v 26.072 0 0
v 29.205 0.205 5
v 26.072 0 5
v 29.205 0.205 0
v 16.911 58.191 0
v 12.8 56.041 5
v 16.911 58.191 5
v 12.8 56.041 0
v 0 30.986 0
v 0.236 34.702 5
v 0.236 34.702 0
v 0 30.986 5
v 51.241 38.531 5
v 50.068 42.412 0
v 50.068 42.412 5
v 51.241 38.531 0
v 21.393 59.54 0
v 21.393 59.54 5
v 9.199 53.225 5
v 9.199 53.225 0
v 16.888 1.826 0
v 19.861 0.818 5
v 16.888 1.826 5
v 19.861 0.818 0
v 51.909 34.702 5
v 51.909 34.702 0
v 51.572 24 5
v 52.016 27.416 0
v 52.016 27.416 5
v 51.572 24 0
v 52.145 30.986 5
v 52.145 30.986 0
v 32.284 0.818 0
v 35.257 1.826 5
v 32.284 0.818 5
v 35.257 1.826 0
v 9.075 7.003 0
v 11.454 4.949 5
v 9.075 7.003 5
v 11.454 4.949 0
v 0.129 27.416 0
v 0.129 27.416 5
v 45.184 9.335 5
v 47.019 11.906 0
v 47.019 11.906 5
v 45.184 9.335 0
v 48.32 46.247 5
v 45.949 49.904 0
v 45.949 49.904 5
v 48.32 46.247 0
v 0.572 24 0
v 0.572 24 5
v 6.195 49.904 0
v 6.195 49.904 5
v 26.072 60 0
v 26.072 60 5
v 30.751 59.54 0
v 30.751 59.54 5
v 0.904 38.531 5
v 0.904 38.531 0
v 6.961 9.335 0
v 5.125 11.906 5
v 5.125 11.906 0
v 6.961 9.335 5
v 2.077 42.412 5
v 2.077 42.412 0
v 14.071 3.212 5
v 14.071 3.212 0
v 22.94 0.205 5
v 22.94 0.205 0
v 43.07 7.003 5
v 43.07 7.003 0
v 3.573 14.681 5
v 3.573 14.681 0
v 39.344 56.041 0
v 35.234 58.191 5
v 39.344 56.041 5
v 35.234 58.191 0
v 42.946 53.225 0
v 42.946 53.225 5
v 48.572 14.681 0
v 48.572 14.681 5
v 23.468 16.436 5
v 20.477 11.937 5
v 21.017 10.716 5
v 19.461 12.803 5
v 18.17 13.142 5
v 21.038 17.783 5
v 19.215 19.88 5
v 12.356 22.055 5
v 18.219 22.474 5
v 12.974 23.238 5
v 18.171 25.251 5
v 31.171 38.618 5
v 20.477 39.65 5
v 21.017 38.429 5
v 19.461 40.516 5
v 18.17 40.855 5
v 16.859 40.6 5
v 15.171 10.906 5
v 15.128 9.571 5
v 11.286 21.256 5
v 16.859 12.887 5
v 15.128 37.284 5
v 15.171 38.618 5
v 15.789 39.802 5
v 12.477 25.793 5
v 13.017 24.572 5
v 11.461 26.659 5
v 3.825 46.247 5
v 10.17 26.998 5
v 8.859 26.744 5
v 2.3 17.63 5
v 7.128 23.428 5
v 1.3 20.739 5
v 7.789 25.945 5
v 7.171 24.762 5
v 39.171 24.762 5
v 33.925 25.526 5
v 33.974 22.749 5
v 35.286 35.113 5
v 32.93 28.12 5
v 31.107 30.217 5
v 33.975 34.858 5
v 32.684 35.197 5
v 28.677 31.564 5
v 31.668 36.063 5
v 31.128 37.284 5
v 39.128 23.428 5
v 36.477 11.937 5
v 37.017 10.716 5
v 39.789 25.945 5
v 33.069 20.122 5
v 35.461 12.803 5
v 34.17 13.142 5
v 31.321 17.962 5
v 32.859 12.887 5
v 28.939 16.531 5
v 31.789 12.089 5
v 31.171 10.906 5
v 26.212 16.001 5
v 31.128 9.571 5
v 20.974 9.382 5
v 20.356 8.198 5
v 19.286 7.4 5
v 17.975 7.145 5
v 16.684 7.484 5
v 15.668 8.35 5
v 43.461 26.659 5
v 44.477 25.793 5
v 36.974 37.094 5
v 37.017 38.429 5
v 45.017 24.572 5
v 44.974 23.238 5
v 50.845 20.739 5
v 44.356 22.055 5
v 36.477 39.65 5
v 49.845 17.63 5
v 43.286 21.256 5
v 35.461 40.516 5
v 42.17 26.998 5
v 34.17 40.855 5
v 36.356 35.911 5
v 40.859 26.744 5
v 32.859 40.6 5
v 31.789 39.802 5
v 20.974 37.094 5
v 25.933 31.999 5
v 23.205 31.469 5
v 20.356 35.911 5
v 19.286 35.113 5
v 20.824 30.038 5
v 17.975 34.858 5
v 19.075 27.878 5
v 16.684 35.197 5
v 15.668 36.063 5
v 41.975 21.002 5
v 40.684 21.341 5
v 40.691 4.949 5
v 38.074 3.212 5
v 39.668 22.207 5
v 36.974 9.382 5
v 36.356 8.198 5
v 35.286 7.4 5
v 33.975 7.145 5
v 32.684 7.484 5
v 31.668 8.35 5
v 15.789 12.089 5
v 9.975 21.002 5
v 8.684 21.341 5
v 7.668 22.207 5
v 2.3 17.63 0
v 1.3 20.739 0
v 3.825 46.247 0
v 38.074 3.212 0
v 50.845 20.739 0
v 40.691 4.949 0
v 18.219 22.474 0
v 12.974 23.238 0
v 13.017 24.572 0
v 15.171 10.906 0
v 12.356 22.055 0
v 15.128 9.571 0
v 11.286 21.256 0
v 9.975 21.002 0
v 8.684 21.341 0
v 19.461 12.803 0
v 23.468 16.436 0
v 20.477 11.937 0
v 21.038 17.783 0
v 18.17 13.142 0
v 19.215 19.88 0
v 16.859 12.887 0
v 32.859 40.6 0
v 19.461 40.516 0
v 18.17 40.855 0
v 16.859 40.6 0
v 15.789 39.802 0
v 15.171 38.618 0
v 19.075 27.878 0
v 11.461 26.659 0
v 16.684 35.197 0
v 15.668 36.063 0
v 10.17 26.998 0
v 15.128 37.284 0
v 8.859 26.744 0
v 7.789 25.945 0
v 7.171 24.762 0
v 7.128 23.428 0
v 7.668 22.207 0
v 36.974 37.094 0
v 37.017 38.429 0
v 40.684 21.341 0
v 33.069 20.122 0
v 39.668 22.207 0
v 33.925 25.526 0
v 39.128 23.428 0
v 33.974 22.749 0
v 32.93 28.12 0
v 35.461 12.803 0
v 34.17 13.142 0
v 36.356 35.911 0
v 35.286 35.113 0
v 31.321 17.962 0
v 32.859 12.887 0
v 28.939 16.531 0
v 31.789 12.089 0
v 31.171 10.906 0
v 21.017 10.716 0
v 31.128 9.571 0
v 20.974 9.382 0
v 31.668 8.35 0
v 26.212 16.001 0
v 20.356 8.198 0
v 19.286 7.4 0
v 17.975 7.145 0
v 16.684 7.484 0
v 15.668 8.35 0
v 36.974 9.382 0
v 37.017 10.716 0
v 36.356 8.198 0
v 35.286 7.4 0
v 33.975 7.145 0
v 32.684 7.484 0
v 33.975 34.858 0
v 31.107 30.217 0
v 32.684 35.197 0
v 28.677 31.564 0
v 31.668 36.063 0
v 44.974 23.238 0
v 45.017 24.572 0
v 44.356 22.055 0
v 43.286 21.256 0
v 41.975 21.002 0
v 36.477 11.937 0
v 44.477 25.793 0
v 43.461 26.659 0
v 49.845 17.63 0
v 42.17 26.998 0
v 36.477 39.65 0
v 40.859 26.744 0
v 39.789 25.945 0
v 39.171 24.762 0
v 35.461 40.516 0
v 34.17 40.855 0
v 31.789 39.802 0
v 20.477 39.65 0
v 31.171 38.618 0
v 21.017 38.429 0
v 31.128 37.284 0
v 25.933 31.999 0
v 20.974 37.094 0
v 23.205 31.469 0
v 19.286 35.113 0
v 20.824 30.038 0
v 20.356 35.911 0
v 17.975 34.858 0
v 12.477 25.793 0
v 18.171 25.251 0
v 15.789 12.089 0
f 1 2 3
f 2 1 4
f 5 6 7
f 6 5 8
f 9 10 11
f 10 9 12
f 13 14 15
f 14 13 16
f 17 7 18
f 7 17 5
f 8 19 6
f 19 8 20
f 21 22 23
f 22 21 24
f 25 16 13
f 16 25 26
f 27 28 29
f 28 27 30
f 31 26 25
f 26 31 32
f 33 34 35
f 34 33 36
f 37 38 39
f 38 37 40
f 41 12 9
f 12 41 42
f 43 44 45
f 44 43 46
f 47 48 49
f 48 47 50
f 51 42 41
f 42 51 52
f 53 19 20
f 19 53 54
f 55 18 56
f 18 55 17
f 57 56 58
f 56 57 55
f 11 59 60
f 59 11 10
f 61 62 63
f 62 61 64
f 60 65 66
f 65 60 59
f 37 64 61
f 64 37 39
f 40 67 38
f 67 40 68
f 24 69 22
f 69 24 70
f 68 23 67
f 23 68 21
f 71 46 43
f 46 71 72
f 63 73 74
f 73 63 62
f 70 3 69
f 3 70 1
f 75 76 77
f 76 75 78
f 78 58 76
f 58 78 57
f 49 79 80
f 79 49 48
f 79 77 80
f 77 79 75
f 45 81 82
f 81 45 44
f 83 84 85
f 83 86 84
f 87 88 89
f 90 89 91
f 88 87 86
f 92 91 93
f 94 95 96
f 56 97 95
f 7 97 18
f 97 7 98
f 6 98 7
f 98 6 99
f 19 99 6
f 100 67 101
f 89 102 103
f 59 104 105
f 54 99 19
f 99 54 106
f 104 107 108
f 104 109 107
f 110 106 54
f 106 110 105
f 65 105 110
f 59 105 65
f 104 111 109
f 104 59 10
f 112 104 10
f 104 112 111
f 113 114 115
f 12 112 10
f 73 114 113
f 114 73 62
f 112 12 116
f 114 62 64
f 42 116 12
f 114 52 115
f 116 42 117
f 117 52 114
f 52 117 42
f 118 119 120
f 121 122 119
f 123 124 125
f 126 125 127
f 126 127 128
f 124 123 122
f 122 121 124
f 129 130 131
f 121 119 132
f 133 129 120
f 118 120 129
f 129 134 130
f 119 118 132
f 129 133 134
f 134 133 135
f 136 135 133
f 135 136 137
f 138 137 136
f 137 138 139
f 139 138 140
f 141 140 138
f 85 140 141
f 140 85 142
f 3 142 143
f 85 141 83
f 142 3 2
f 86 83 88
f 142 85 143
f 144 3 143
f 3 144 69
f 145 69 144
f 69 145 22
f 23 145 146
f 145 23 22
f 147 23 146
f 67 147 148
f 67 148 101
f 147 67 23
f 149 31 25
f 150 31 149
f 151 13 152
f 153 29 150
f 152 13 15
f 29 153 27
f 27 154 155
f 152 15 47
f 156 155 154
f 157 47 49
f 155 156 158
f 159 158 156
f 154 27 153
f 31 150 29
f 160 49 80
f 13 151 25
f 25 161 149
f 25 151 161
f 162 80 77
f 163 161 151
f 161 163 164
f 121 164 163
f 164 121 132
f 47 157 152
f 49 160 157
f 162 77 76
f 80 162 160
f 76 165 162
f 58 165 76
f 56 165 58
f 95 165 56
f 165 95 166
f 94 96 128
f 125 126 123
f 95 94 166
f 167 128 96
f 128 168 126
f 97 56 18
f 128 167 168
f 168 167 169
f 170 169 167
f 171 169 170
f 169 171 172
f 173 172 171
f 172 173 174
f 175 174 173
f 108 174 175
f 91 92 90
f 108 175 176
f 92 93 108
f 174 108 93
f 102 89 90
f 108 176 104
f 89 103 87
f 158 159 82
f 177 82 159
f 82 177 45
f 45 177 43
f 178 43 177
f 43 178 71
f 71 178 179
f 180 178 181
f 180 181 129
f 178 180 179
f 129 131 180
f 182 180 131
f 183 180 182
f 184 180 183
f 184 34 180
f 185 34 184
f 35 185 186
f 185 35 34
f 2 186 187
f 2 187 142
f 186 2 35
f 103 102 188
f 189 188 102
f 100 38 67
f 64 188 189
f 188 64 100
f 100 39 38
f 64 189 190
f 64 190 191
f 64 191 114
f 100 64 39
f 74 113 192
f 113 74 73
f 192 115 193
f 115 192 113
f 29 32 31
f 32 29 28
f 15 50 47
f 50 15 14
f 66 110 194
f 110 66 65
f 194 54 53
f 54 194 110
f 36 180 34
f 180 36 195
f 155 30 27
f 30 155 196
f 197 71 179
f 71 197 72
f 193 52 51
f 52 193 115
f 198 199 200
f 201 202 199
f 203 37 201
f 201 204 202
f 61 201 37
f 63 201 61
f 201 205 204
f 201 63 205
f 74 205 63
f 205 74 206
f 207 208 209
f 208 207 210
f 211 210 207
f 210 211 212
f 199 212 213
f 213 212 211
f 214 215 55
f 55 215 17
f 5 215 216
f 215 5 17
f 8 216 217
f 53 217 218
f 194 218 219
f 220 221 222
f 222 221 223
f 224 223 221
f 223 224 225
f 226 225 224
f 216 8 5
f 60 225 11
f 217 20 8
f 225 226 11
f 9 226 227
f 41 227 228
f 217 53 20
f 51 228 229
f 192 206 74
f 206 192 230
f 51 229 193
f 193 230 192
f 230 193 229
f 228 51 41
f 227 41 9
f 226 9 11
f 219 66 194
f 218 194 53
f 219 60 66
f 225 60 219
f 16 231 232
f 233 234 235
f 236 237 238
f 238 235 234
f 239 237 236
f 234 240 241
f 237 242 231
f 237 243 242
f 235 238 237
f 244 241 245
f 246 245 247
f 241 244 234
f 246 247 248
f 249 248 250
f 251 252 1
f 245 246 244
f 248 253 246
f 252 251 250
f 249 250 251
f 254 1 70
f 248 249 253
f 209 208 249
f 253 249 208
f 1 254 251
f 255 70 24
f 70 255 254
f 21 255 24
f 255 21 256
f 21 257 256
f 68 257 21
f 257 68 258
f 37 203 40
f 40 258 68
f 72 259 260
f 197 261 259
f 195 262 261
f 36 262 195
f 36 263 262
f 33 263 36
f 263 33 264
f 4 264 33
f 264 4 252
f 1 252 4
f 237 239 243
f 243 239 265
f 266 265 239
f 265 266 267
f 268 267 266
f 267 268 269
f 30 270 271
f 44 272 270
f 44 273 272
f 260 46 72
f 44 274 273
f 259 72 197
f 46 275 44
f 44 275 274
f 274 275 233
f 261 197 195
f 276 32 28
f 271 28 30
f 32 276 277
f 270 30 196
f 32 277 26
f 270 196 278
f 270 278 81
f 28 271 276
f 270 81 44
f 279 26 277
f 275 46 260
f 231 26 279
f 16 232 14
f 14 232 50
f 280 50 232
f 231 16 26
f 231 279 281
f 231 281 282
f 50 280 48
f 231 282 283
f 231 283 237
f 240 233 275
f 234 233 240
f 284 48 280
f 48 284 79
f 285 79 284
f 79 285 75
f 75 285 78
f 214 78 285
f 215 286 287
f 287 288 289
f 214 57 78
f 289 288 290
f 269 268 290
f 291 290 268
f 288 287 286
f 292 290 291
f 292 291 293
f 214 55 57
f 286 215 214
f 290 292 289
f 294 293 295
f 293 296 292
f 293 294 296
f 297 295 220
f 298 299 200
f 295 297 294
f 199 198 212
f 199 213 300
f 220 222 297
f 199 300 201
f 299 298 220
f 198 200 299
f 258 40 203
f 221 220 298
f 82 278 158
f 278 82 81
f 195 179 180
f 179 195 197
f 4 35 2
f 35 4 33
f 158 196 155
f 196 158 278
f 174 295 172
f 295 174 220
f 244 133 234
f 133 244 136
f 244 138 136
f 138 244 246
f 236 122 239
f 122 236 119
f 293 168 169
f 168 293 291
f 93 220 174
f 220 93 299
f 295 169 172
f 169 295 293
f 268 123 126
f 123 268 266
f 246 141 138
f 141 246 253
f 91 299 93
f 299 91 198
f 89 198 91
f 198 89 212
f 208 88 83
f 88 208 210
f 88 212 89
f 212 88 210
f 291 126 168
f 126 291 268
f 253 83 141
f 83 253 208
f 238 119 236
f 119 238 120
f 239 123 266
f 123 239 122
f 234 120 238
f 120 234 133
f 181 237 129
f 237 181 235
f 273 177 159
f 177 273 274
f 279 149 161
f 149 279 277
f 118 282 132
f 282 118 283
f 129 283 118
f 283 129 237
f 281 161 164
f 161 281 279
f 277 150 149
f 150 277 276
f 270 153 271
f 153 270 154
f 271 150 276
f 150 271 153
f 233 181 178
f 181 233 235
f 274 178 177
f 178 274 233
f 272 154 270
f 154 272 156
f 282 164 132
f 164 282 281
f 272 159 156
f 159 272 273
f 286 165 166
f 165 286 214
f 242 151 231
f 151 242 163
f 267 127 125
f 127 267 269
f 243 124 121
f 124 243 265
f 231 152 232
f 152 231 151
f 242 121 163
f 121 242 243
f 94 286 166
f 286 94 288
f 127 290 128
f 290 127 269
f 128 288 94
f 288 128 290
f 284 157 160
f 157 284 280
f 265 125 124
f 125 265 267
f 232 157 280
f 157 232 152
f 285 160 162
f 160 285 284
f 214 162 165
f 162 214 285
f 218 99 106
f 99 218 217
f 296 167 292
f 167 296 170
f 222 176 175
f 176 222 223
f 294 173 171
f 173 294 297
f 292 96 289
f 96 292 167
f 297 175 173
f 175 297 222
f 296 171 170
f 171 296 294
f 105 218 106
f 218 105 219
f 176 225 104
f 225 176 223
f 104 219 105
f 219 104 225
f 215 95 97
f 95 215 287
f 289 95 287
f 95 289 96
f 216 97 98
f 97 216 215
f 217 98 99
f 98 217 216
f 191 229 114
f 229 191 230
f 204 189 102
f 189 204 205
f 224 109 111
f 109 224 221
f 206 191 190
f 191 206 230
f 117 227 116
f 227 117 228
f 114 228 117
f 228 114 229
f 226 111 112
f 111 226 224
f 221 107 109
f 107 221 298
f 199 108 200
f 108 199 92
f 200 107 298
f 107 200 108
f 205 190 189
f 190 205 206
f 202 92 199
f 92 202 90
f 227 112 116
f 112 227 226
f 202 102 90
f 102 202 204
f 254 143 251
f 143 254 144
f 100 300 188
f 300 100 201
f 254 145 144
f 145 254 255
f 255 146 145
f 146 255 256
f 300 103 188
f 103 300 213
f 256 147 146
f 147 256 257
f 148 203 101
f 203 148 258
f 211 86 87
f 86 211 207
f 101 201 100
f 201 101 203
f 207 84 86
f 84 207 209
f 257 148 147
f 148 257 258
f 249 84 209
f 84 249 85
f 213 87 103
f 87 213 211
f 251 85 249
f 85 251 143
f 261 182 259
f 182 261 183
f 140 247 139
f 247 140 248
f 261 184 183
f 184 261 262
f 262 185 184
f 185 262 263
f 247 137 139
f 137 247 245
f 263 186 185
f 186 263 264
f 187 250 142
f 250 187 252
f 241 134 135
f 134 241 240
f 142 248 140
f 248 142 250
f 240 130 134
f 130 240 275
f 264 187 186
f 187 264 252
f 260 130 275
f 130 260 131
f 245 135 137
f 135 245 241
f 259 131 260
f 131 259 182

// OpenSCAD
$fn = 32;

// ----------------------------------------------------------------------
// Cam plate: single_lobe cam, base R24
// ----------------------------------------------------------------------

// --- parameters (mm) ---
base_r = 24;              // base circle radius
lobe_h = 12;              // cam lobe rise
bore_r = 8;               // shaft bore radius
plate_t = 5;              // plate thickness, Z (extrusion height)
ring_r = 16;              // lightening ring radius
bolt_r = 3;               // lightening hole radius

profile = [[51.572, 24], [52.016, 27.416], [52.145, 30.986], [51.909, 34.702], [51.241, 38.531], [50.068, 42.412], [48.32, 46.247], [45.949, 49.904], [42.946, 53.225], [39.344, 56.041], [35.234, 58.191], [30.751, 59.54], [26.072, 60], [21.393, 59.54], [16.911, 58.191], [12.8, 56.041], [9.199, 53.225], [6.195, 49.904], [3.825, 46.247], [2.077, 42.412], [0.904, 38.531], [0.236, 34.702], [0, 30.986], [0.129, 27.416], [0.572, 24], [1.3, 20.739], [2.3, 17.63], [3.573, 14.681], [5.125, 11.906], [6.961, 9.335], [9.075, 7.003], [11.454, 4.949], [14.071, 3.212], [16.888, 1.826], [19.861, 0.818], [22.94, 0.205], [26.072, 0], [29.205, 0.205], [32.284, 0.818], [35.257, 1.826], [38.074, 3.212], [40.691, 4.949], [43.07, 7.003], [45.184, 9.335], [47.019, 11.906], [48.572, 14.681], [49.845, 17.63], [50.845, 20.739]];  // primary outline, 48 points, counter clockwise
void_1 = [[33.925, 25.526], [32.93, 28.12], [31.107, 30.217], [28.677, 31.564], [25.933, 31.999], [23.205, 31.469], [20.824, 30.038], [19.075, 27.878], [18.171, 25.251], [18.219, 22.474], [19.215, 19.88], [21.038, 17.783], [23.468, 16.436], [26.212, 16.001], [28.939, 16.531], [31.321, 17.962], [33.069, 20.122], [33.974, 22.749]];  // shaft bore, 18 points
void_2 = [[45.017, 24.572], [44.477, 25.793], [43.461, 26.659], [42.17, 26.998], [40.859, 26.744], [39.789, 25.945], [39.171, 24.762], [39.128, 23.428], [39.668, 22.207], [40.684, 21.341], [41.975, 21.002], [43.286, 21.256], [44.356, 22.055], [44.974, 23.238]];  // lightening hole 1, 14 points
void_3 = [[37.017, 38.429], [36.477, 39.65], [35.461, 40.516], [34.17, 40.855], [32.859, 40.6], [31.789, 39.802], [31.171, 38.618], [31.128, 37.284], [31.668, 36.063], [32.684, 35.197], [33.975, 34.858], [35.286, 35.113], [36.356, 35.911], [36.974, 37.094]];  // lightening hole 2, 14 points
void_4 = [[21.017, 38.429], [20.477, 39.65], [19.461, 40.516], [18.17, 40.855], [16.859, 40.6], [15.789, 39.802], [15.171, 38.618], [15.128, 37.284], [15.668, 36.063], [16.684, 35.197], [17.975, 34.858], [19.286, 35.113], [20.356, 35.911], [20.974, 37.094]];  // lightening hole 3, 14 points
void_5 = [[13.017, 24.572], [12.477, 25.793], [11.461, 26.659], [10.17, 26.998], [8.859, 26.744], [7.789, 25.945], [7.171, 24.762], [7.128, 23.428], [7.668, 22.207], [8.684, 21.341], [9.975, 21.002], [11.286, 21.256], [12.356, 22.055], [12.974, 23.238]];  // lightening hole 4, 14 points
void_6 = [[21.017, 10.716], [20.477, 11.937], [19.461, 12.803], [18.17, 13.142], [16.859, 12.887], [15.789, 12.089], [15.171, 10.906], [15.128, 9.571], [15.668, 8.35], [16.684, 7.484], [17.975, 7.145], [19.286, 7.4], [20.356, 8.198], [20.974, 9.382]];  // lightening hole 5, 14 points
void_7 = [[37.017, 10.716], [36.477, 11.937], [35.461, 12.803], [34.17, 13.142], [32.859, 12.887], [31.789, 12.089], [31.171, 10.906], [31.128, 9.571], [31.668, 8.35], [32.684, 7.484], [33.975, 7.145], [35.286, 7.4], [36.356, 8.198], [36.974, 9.382]];  // lightening hole 6, 14 points

// --- the one profile operation ---
difference() {
  linear_extrude(height = plate_t) polygon(points = profile);
  translate([0, 0, -1])
    linear_extrude(height = plate_t + 2) polygon(points = void_1);
  translate([0, 0, -1])
    linear_extrude(height = plate_t + 2) polygon(points = void_2);
  translate([0, 0, -1])
    linear_extrude(height = plate_t + 2) polygon(points = void_3);
  translate([0, 0, -1])
    linear_extrude(height = plate_t + 2) polygon(points = void_4);
  translate([0, 0, -1])
    linear_extrude(height = plate_t + 2) polygon(points = void_5);
  translate([0, 0, -1])
    linear_extrude(height = plate_t + 2) polygon(points = void_6);
  translate([0, 0, -1])
    linear_extrude(height = plate_t + 2) polygon(points = void_7);
}
